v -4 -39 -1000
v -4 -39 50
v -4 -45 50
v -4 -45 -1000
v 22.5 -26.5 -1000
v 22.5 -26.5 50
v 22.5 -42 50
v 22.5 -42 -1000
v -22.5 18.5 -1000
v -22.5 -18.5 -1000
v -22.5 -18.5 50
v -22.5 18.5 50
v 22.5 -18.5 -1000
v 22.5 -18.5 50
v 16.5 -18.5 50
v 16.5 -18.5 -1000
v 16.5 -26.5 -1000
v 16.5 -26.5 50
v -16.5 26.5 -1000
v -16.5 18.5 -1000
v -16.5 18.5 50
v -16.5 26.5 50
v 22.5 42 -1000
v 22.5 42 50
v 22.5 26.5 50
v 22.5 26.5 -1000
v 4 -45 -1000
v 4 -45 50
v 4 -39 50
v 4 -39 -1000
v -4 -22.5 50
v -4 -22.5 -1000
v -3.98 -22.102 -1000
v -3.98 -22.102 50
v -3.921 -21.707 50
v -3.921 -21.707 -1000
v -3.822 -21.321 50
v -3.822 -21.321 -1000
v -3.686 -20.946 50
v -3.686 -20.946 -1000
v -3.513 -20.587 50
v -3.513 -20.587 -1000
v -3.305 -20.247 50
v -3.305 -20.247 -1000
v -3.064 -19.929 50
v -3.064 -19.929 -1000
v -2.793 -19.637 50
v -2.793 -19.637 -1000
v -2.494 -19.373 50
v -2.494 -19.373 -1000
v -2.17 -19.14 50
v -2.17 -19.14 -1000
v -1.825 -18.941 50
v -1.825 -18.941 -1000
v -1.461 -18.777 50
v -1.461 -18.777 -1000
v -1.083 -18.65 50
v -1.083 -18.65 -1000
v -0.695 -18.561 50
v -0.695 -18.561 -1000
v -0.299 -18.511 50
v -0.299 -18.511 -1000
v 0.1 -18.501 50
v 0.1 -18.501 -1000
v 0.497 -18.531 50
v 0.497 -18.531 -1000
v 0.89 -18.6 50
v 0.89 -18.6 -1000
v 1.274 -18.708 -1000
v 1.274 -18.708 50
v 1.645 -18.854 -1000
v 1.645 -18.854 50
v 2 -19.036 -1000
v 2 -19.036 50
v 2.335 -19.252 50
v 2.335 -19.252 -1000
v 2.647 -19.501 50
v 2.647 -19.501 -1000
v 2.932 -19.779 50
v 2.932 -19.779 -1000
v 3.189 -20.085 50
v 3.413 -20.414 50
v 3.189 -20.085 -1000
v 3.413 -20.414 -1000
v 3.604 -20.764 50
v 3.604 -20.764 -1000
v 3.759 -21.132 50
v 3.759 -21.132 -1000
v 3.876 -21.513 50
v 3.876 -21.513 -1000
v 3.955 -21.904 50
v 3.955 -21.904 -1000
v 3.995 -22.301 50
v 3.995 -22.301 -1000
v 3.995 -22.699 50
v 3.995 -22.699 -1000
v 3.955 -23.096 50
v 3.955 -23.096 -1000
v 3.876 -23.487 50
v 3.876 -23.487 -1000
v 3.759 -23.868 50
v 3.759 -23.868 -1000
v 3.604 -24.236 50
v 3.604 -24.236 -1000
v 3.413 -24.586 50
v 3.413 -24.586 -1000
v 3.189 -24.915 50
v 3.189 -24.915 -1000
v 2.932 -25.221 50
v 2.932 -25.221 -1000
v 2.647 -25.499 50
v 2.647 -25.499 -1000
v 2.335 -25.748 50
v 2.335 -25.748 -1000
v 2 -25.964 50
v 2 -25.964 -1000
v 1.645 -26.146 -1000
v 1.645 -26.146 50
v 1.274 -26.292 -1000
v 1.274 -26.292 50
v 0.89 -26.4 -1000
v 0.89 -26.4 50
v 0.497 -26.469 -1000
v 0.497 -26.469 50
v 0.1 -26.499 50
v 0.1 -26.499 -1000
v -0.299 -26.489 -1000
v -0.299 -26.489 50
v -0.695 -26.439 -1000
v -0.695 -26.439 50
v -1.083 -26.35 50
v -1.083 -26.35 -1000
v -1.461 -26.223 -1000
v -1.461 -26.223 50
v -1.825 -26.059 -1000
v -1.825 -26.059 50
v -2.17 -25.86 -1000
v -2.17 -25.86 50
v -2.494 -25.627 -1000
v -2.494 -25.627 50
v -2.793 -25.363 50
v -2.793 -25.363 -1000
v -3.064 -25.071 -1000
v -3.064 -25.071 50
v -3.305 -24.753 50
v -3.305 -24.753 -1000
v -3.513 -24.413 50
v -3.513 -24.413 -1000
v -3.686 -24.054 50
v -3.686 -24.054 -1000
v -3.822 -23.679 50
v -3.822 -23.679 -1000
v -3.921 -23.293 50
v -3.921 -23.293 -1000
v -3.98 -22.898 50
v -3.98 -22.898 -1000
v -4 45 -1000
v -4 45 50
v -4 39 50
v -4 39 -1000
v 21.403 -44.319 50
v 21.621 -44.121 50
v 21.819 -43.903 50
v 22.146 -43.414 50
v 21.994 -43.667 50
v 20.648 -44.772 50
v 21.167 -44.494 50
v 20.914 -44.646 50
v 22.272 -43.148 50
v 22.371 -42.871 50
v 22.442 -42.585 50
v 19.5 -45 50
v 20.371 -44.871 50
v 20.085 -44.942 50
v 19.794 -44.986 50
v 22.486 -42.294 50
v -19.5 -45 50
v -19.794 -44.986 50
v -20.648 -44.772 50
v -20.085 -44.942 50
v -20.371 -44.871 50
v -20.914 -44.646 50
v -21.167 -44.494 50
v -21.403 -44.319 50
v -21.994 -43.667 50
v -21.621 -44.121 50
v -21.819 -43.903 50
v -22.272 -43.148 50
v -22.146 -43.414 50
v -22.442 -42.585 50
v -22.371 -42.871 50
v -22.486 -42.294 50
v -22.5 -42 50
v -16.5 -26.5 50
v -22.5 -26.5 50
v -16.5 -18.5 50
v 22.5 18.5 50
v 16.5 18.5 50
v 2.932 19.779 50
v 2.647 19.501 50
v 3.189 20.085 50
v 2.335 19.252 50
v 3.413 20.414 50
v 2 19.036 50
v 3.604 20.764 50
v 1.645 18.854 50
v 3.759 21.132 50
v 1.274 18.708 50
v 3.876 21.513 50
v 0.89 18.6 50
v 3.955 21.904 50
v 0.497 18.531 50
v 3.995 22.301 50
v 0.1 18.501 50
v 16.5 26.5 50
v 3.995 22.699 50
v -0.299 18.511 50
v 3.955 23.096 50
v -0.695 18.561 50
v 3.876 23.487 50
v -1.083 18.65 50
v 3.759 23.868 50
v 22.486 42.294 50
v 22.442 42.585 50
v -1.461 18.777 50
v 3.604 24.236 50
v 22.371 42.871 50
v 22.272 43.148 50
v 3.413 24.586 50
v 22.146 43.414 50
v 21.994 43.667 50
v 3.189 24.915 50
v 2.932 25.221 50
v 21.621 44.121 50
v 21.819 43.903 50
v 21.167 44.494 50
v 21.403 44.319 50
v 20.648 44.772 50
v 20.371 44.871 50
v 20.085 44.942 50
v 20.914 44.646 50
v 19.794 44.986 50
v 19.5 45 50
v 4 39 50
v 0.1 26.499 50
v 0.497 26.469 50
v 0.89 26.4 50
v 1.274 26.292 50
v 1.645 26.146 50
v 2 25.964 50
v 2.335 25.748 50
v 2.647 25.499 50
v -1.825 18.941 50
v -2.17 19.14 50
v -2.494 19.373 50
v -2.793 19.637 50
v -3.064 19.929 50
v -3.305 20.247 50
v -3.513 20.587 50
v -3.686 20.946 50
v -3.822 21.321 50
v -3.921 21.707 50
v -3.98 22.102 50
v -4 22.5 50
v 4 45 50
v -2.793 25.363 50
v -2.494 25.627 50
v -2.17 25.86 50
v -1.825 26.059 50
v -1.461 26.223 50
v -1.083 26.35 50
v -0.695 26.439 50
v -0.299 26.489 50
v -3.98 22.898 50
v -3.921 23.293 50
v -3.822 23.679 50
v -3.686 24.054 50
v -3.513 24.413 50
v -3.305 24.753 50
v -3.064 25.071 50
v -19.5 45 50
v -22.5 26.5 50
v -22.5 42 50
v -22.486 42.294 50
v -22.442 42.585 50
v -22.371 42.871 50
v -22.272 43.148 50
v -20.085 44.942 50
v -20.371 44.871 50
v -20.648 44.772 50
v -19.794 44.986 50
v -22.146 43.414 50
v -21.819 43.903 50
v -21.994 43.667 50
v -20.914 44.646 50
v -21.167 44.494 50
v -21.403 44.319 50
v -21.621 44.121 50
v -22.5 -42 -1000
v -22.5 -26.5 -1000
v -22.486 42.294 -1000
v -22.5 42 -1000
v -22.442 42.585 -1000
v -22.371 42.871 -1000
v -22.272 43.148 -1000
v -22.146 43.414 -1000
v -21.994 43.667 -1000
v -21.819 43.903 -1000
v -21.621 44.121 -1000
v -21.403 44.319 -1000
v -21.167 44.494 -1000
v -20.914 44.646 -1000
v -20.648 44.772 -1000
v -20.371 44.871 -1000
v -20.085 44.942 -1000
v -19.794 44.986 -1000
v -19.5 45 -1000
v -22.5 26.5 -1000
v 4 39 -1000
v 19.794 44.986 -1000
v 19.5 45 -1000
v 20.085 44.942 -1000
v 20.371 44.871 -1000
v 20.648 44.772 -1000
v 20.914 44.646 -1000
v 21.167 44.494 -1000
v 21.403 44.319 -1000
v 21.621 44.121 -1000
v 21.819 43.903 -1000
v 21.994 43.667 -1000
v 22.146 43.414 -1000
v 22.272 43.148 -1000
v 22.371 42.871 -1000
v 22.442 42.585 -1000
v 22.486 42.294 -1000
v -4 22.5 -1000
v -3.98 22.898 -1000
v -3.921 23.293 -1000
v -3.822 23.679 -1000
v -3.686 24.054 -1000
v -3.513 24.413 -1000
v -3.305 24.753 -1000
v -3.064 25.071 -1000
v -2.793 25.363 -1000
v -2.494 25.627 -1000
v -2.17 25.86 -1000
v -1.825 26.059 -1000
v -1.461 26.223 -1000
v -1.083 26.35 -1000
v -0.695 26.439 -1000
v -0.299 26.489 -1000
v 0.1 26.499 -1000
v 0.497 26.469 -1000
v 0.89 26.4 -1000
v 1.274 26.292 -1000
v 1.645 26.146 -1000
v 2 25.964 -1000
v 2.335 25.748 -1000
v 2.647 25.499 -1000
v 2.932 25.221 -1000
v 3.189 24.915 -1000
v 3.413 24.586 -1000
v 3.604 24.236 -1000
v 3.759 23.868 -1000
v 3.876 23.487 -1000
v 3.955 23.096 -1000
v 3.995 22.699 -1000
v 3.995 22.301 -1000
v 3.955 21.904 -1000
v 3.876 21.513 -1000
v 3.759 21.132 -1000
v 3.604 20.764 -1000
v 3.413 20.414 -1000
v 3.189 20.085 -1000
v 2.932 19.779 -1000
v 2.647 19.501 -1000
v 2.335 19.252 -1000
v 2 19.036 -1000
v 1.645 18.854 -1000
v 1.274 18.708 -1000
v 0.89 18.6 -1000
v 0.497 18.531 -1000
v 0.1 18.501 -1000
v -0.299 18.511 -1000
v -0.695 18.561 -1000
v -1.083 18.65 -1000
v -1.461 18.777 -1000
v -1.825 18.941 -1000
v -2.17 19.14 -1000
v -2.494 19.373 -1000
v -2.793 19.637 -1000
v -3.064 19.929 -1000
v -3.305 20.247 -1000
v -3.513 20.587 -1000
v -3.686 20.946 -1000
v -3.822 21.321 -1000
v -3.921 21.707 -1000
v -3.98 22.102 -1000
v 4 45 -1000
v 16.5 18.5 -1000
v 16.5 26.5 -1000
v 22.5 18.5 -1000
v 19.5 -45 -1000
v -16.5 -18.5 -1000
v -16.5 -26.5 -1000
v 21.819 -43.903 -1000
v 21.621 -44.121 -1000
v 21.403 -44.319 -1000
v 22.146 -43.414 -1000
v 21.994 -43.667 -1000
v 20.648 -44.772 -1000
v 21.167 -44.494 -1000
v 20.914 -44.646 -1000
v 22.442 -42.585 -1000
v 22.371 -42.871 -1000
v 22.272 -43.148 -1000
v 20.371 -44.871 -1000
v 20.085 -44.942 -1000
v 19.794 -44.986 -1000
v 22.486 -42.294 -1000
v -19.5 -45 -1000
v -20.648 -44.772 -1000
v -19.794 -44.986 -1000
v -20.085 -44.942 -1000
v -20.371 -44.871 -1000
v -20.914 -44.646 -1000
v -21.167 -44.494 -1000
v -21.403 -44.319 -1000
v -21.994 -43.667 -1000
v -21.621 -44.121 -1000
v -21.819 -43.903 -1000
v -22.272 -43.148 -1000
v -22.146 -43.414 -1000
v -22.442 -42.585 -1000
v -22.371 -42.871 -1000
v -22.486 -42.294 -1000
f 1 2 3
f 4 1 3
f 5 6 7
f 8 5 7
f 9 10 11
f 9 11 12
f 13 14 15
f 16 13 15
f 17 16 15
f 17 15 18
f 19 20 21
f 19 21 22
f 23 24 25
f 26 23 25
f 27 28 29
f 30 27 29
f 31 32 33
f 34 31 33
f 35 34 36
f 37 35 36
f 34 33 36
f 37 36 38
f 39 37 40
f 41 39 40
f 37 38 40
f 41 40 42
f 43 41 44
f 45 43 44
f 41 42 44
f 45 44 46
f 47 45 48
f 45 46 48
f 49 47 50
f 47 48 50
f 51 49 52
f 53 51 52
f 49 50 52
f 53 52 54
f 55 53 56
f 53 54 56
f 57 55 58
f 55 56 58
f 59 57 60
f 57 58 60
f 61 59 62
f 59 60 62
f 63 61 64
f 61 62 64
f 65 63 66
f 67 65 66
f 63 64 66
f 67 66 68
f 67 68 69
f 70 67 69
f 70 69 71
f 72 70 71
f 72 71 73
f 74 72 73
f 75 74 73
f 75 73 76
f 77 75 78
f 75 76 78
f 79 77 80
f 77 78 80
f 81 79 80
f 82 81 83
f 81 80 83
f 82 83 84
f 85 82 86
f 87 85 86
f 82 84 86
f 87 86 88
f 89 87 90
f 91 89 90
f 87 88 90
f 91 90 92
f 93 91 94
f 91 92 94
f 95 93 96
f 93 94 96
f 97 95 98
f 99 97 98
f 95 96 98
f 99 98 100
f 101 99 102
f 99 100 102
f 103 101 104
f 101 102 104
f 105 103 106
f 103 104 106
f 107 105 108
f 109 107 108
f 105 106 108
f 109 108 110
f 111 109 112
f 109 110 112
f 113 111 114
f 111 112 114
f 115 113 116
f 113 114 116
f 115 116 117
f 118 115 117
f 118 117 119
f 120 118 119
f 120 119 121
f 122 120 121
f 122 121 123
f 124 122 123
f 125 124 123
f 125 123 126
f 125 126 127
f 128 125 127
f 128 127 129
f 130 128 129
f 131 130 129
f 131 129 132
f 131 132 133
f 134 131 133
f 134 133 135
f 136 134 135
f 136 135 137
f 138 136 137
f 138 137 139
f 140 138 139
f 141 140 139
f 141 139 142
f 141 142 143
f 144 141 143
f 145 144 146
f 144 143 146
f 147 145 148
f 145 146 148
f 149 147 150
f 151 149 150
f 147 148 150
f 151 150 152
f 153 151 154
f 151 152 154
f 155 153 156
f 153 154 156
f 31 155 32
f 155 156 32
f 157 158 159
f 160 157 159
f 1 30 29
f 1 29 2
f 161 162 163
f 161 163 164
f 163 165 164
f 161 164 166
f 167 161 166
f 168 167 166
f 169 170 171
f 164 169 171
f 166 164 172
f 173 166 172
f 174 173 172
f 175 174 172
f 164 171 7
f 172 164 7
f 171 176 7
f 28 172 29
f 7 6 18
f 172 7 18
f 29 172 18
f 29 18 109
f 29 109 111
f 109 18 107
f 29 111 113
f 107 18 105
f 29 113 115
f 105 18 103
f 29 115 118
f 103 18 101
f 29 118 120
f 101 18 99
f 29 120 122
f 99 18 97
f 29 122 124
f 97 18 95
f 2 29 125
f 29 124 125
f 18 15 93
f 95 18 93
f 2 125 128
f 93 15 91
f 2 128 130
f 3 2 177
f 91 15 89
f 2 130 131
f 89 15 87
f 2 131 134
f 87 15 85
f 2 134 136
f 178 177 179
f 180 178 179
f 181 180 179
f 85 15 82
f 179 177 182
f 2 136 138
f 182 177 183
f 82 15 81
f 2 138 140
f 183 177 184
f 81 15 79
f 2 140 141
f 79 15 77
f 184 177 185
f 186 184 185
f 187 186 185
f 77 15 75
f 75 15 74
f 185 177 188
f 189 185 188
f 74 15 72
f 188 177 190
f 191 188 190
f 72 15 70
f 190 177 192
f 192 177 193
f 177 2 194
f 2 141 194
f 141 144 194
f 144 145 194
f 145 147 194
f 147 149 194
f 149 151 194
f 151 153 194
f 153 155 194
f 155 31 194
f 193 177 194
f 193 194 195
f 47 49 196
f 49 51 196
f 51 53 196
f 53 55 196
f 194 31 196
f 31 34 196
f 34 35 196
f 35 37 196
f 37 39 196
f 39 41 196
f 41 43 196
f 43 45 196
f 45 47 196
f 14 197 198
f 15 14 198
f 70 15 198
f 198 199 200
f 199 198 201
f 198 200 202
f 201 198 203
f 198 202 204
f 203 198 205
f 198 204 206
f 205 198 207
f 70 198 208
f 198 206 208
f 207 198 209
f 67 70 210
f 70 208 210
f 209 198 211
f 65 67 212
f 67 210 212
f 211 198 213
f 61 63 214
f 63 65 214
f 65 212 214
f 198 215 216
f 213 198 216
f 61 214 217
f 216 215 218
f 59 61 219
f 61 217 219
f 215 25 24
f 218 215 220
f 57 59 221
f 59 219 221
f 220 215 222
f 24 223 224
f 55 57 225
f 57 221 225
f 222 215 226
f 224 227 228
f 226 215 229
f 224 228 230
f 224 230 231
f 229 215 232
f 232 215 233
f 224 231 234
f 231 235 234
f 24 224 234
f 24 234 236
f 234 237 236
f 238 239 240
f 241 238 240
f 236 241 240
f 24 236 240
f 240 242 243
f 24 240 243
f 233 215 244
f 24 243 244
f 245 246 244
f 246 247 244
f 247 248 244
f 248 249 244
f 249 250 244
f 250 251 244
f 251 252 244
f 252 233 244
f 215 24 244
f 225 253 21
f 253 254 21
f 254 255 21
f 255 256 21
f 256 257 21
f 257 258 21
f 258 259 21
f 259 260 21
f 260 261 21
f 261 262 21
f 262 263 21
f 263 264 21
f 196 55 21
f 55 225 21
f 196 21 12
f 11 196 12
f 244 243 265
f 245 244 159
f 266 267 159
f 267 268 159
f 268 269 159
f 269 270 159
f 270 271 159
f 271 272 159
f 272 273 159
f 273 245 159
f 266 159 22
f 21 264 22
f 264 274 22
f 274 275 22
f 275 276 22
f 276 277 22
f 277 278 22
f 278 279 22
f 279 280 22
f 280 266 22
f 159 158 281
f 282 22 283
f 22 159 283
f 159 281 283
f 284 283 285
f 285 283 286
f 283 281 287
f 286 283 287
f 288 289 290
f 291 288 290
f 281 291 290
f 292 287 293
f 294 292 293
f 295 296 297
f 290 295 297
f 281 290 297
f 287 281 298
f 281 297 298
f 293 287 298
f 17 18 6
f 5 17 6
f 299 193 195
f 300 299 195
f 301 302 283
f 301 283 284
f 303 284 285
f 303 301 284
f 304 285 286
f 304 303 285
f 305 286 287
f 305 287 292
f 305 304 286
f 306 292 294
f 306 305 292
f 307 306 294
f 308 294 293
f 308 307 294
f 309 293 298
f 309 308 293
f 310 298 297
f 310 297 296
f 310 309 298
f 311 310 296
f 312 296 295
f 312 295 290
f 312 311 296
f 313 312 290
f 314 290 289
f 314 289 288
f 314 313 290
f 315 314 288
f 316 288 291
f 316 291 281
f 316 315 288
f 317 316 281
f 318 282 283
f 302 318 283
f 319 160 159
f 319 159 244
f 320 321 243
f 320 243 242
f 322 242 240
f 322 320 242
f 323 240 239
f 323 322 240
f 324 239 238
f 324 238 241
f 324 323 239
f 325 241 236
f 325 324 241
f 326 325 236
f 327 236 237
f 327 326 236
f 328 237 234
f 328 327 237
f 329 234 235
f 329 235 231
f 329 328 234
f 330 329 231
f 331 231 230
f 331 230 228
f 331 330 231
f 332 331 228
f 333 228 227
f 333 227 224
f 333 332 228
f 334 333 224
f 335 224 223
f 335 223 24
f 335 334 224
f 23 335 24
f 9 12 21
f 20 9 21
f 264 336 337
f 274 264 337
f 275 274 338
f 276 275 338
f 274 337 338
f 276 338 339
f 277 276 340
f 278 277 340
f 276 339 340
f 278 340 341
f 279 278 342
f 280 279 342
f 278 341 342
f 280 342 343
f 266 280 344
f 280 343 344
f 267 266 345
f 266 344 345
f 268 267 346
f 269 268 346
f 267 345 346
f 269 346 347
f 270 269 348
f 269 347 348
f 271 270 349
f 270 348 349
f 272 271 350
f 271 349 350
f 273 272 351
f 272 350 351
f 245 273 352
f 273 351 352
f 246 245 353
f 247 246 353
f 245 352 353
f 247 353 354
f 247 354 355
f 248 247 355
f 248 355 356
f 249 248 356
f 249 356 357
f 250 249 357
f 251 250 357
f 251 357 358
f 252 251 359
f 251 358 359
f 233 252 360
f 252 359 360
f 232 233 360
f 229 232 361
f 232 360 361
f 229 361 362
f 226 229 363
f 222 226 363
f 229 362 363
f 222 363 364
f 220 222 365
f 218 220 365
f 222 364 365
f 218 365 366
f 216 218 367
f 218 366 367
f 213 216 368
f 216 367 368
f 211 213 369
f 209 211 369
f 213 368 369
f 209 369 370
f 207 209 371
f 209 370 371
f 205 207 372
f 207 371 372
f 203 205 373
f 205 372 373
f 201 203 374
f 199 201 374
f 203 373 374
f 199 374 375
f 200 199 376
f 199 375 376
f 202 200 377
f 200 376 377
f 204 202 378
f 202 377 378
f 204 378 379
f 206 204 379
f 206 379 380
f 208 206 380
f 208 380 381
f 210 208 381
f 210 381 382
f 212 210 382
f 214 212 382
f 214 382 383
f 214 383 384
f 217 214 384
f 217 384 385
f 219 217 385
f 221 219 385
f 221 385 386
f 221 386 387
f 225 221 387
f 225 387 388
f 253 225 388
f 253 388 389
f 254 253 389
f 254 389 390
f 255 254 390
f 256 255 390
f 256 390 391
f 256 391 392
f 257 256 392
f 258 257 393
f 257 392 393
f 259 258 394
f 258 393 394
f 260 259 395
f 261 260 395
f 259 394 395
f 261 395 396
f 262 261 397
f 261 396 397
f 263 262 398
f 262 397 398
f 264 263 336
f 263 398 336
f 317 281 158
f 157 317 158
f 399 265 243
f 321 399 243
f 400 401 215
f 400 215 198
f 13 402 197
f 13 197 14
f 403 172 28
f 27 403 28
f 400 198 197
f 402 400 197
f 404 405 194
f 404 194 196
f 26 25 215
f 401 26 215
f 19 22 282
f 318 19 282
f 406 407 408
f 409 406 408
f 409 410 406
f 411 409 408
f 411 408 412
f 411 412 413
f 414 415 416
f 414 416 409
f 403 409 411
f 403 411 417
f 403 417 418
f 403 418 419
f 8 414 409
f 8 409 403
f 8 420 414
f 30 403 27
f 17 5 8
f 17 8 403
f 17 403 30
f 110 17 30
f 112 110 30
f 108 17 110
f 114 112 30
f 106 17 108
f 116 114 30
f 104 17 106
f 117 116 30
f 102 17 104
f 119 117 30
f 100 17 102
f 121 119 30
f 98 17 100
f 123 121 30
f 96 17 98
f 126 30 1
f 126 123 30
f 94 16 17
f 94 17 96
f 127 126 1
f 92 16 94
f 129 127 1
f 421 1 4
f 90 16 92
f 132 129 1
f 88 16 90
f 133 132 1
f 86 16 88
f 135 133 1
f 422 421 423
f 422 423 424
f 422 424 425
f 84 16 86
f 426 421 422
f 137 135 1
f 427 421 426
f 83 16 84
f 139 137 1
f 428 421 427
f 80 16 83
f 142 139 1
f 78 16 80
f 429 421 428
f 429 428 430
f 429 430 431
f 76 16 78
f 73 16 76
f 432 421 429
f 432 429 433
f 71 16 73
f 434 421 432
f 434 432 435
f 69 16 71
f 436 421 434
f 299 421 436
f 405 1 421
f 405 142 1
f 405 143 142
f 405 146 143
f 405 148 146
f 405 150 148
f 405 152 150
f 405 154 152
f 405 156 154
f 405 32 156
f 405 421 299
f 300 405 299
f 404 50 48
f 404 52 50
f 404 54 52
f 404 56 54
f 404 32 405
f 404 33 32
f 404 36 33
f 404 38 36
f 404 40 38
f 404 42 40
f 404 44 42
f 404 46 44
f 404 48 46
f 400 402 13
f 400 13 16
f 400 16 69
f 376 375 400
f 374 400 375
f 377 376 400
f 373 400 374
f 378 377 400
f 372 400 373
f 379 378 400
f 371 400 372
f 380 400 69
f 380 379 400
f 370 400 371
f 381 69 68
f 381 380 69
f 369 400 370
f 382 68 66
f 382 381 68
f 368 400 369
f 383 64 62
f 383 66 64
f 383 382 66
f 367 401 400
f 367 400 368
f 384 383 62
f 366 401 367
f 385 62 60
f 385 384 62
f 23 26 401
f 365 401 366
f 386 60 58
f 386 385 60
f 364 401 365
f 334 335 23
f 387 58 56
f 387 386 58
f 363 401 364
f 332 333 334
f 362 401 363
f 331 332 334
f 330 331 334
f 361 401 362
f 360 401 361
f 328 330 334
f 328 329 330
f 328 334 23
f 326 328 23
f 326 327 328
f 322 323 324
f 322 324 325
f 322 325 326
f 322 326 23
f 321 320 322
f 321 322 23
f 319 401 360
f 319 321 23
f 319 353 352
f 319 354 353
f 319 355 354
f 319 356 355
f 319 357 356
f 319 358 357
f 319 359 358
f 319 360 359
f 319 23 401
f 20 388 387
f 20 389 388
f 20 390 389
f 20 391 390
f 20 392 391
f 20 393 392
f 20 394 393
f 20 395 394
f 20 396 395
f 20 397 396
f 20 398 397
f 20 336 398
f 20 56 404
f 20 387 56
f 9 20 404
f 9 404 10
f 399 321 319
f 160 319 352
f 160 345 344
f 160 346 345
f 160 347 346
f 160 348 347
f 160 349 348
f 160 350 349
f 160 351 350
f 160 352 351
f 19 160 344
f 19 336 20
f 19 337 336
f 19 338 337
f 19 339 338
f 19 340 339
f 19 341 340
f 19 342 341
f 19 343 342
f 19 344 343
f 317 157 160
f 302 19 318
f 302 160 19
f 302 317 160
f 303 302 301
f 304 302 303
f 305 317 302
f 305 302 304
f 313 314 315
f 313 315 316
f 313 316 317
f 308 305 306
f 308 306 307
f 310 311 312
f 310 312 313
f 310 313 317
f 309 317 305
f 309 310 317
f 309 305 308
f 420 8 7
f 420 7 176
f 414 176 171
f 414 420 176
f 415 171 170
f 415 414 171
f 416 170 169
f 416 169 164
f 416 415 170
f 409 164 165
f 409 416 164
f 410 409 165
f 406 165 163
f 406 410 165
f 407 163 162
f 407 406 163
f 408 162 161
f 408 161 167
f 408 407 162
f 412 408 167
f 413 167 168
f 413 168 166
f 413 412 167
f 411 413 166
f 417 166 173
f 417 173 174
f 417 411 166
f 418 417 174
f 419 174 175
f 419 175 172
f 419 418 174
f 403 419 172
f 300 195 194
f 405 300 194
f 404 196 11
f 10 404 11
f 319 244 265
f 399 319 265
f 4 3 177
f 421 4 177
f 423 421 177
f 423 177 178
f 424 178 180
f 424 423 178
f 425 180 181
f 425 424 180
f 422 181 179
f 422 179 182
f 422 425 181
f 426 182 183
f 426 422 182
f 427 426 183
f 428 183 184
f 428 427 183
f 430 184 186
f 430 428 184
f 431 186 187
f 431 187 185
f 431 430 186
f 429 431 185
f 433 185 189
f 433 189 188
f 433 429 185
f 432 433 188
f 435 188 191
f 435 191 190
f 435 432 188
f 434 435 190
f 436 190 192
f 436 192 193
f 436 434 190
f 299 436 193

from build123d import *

# Parameters (mm, degrees)
ESQUISSE1_R        = 4
BOSS_EXTRU_1_DEPTH = 1050


with BuildPart() as part:
    # Esquisse1 → Boss.-Extru.1 (new body)
    with BuildSketch(Plane(origin=(0, 0, -1000), x_dir=(-1, 0, 0), z_dir=(0, 0, -1))):
        with BuildLine():
            Line((16.5, 26.5), (22.5, 26.5))
            Line((22.5, 26.5), (22.5, 42))
            ThreePointArc((22.5, 42), (21.621320344, 44.121320344), (19.5, 45))
            Line((19.5, 45), (4, 45))
            Line((4, 45), (4, 39))
            Line((4, 39), (-4, 39))
            Line((-4, 39), (-4, 45))
            Line((-4, 45), (-19.5, 45))
            ThreePointArc((-19.5, 45), (-21.621320344, 44.121320344), (-22.5, 42))
            Line((-22.5, 42), (-22.5, 26.5))
            Line((-22.5, 26.5), (-16.5, 26.5))
            Line((-16.5, 26.5), (-16.5, 18.5))
            Line((-16.5, 18.5), (-22.5, 18.5))
            Line((-22.5, 18.5), (-22.5, -18.5))
            Line((-22.5, -18.5), (-16.5, -18.5))
            Line((-16.5, -18.5), (-16.5, -26.5))
            Line((-16.5, -26.5), (-22.5, -26.5))
            Line((-22.5, -26.5), (-22.5, -42))
            ThreePointArc((-22.5, -42), (-21.621320344, -44.121320344), (-19.5, -45))
            Line((-19.5, -45), (-4, -45))
            Line((-4, -45), (-4, -39))
            Line((-4, -39), (4, -39))
            Line((4, -39), (4, -45))
            Line((4, -45), (19.5, -45))
            ThreePointArc((19.5, -45), (21.621320344, -44.121320344), (22.5, -42))
            Line((22.5, -42), (22.5, -26.5))
            Line((22.5, -26.5), (16.5, -26.5))
            Line((16.5, -26.5), (16.5, -18.5))
            Line((16.5, -18.5), (22.5, -18.5))
            Line((22.5, -18.5), (22.5, 18.5))
            Line((22.5, 18.5), (16.5, 18.5))
            Line((16.5, 18.5), (16.5, 26.5))
        make_face()
        with Locations((0, 22.5)):
            Circle(ESQUISSE1_R, mode=Mode.SUBTRACT)
        with Locations((0, -22.5)):
            Circle(ESQUISSE1_R, mode=Mode.SUBTRACT)
    extrude(amount=-BOSS_EXTRU_1_DEPTH)


solid = part.part
